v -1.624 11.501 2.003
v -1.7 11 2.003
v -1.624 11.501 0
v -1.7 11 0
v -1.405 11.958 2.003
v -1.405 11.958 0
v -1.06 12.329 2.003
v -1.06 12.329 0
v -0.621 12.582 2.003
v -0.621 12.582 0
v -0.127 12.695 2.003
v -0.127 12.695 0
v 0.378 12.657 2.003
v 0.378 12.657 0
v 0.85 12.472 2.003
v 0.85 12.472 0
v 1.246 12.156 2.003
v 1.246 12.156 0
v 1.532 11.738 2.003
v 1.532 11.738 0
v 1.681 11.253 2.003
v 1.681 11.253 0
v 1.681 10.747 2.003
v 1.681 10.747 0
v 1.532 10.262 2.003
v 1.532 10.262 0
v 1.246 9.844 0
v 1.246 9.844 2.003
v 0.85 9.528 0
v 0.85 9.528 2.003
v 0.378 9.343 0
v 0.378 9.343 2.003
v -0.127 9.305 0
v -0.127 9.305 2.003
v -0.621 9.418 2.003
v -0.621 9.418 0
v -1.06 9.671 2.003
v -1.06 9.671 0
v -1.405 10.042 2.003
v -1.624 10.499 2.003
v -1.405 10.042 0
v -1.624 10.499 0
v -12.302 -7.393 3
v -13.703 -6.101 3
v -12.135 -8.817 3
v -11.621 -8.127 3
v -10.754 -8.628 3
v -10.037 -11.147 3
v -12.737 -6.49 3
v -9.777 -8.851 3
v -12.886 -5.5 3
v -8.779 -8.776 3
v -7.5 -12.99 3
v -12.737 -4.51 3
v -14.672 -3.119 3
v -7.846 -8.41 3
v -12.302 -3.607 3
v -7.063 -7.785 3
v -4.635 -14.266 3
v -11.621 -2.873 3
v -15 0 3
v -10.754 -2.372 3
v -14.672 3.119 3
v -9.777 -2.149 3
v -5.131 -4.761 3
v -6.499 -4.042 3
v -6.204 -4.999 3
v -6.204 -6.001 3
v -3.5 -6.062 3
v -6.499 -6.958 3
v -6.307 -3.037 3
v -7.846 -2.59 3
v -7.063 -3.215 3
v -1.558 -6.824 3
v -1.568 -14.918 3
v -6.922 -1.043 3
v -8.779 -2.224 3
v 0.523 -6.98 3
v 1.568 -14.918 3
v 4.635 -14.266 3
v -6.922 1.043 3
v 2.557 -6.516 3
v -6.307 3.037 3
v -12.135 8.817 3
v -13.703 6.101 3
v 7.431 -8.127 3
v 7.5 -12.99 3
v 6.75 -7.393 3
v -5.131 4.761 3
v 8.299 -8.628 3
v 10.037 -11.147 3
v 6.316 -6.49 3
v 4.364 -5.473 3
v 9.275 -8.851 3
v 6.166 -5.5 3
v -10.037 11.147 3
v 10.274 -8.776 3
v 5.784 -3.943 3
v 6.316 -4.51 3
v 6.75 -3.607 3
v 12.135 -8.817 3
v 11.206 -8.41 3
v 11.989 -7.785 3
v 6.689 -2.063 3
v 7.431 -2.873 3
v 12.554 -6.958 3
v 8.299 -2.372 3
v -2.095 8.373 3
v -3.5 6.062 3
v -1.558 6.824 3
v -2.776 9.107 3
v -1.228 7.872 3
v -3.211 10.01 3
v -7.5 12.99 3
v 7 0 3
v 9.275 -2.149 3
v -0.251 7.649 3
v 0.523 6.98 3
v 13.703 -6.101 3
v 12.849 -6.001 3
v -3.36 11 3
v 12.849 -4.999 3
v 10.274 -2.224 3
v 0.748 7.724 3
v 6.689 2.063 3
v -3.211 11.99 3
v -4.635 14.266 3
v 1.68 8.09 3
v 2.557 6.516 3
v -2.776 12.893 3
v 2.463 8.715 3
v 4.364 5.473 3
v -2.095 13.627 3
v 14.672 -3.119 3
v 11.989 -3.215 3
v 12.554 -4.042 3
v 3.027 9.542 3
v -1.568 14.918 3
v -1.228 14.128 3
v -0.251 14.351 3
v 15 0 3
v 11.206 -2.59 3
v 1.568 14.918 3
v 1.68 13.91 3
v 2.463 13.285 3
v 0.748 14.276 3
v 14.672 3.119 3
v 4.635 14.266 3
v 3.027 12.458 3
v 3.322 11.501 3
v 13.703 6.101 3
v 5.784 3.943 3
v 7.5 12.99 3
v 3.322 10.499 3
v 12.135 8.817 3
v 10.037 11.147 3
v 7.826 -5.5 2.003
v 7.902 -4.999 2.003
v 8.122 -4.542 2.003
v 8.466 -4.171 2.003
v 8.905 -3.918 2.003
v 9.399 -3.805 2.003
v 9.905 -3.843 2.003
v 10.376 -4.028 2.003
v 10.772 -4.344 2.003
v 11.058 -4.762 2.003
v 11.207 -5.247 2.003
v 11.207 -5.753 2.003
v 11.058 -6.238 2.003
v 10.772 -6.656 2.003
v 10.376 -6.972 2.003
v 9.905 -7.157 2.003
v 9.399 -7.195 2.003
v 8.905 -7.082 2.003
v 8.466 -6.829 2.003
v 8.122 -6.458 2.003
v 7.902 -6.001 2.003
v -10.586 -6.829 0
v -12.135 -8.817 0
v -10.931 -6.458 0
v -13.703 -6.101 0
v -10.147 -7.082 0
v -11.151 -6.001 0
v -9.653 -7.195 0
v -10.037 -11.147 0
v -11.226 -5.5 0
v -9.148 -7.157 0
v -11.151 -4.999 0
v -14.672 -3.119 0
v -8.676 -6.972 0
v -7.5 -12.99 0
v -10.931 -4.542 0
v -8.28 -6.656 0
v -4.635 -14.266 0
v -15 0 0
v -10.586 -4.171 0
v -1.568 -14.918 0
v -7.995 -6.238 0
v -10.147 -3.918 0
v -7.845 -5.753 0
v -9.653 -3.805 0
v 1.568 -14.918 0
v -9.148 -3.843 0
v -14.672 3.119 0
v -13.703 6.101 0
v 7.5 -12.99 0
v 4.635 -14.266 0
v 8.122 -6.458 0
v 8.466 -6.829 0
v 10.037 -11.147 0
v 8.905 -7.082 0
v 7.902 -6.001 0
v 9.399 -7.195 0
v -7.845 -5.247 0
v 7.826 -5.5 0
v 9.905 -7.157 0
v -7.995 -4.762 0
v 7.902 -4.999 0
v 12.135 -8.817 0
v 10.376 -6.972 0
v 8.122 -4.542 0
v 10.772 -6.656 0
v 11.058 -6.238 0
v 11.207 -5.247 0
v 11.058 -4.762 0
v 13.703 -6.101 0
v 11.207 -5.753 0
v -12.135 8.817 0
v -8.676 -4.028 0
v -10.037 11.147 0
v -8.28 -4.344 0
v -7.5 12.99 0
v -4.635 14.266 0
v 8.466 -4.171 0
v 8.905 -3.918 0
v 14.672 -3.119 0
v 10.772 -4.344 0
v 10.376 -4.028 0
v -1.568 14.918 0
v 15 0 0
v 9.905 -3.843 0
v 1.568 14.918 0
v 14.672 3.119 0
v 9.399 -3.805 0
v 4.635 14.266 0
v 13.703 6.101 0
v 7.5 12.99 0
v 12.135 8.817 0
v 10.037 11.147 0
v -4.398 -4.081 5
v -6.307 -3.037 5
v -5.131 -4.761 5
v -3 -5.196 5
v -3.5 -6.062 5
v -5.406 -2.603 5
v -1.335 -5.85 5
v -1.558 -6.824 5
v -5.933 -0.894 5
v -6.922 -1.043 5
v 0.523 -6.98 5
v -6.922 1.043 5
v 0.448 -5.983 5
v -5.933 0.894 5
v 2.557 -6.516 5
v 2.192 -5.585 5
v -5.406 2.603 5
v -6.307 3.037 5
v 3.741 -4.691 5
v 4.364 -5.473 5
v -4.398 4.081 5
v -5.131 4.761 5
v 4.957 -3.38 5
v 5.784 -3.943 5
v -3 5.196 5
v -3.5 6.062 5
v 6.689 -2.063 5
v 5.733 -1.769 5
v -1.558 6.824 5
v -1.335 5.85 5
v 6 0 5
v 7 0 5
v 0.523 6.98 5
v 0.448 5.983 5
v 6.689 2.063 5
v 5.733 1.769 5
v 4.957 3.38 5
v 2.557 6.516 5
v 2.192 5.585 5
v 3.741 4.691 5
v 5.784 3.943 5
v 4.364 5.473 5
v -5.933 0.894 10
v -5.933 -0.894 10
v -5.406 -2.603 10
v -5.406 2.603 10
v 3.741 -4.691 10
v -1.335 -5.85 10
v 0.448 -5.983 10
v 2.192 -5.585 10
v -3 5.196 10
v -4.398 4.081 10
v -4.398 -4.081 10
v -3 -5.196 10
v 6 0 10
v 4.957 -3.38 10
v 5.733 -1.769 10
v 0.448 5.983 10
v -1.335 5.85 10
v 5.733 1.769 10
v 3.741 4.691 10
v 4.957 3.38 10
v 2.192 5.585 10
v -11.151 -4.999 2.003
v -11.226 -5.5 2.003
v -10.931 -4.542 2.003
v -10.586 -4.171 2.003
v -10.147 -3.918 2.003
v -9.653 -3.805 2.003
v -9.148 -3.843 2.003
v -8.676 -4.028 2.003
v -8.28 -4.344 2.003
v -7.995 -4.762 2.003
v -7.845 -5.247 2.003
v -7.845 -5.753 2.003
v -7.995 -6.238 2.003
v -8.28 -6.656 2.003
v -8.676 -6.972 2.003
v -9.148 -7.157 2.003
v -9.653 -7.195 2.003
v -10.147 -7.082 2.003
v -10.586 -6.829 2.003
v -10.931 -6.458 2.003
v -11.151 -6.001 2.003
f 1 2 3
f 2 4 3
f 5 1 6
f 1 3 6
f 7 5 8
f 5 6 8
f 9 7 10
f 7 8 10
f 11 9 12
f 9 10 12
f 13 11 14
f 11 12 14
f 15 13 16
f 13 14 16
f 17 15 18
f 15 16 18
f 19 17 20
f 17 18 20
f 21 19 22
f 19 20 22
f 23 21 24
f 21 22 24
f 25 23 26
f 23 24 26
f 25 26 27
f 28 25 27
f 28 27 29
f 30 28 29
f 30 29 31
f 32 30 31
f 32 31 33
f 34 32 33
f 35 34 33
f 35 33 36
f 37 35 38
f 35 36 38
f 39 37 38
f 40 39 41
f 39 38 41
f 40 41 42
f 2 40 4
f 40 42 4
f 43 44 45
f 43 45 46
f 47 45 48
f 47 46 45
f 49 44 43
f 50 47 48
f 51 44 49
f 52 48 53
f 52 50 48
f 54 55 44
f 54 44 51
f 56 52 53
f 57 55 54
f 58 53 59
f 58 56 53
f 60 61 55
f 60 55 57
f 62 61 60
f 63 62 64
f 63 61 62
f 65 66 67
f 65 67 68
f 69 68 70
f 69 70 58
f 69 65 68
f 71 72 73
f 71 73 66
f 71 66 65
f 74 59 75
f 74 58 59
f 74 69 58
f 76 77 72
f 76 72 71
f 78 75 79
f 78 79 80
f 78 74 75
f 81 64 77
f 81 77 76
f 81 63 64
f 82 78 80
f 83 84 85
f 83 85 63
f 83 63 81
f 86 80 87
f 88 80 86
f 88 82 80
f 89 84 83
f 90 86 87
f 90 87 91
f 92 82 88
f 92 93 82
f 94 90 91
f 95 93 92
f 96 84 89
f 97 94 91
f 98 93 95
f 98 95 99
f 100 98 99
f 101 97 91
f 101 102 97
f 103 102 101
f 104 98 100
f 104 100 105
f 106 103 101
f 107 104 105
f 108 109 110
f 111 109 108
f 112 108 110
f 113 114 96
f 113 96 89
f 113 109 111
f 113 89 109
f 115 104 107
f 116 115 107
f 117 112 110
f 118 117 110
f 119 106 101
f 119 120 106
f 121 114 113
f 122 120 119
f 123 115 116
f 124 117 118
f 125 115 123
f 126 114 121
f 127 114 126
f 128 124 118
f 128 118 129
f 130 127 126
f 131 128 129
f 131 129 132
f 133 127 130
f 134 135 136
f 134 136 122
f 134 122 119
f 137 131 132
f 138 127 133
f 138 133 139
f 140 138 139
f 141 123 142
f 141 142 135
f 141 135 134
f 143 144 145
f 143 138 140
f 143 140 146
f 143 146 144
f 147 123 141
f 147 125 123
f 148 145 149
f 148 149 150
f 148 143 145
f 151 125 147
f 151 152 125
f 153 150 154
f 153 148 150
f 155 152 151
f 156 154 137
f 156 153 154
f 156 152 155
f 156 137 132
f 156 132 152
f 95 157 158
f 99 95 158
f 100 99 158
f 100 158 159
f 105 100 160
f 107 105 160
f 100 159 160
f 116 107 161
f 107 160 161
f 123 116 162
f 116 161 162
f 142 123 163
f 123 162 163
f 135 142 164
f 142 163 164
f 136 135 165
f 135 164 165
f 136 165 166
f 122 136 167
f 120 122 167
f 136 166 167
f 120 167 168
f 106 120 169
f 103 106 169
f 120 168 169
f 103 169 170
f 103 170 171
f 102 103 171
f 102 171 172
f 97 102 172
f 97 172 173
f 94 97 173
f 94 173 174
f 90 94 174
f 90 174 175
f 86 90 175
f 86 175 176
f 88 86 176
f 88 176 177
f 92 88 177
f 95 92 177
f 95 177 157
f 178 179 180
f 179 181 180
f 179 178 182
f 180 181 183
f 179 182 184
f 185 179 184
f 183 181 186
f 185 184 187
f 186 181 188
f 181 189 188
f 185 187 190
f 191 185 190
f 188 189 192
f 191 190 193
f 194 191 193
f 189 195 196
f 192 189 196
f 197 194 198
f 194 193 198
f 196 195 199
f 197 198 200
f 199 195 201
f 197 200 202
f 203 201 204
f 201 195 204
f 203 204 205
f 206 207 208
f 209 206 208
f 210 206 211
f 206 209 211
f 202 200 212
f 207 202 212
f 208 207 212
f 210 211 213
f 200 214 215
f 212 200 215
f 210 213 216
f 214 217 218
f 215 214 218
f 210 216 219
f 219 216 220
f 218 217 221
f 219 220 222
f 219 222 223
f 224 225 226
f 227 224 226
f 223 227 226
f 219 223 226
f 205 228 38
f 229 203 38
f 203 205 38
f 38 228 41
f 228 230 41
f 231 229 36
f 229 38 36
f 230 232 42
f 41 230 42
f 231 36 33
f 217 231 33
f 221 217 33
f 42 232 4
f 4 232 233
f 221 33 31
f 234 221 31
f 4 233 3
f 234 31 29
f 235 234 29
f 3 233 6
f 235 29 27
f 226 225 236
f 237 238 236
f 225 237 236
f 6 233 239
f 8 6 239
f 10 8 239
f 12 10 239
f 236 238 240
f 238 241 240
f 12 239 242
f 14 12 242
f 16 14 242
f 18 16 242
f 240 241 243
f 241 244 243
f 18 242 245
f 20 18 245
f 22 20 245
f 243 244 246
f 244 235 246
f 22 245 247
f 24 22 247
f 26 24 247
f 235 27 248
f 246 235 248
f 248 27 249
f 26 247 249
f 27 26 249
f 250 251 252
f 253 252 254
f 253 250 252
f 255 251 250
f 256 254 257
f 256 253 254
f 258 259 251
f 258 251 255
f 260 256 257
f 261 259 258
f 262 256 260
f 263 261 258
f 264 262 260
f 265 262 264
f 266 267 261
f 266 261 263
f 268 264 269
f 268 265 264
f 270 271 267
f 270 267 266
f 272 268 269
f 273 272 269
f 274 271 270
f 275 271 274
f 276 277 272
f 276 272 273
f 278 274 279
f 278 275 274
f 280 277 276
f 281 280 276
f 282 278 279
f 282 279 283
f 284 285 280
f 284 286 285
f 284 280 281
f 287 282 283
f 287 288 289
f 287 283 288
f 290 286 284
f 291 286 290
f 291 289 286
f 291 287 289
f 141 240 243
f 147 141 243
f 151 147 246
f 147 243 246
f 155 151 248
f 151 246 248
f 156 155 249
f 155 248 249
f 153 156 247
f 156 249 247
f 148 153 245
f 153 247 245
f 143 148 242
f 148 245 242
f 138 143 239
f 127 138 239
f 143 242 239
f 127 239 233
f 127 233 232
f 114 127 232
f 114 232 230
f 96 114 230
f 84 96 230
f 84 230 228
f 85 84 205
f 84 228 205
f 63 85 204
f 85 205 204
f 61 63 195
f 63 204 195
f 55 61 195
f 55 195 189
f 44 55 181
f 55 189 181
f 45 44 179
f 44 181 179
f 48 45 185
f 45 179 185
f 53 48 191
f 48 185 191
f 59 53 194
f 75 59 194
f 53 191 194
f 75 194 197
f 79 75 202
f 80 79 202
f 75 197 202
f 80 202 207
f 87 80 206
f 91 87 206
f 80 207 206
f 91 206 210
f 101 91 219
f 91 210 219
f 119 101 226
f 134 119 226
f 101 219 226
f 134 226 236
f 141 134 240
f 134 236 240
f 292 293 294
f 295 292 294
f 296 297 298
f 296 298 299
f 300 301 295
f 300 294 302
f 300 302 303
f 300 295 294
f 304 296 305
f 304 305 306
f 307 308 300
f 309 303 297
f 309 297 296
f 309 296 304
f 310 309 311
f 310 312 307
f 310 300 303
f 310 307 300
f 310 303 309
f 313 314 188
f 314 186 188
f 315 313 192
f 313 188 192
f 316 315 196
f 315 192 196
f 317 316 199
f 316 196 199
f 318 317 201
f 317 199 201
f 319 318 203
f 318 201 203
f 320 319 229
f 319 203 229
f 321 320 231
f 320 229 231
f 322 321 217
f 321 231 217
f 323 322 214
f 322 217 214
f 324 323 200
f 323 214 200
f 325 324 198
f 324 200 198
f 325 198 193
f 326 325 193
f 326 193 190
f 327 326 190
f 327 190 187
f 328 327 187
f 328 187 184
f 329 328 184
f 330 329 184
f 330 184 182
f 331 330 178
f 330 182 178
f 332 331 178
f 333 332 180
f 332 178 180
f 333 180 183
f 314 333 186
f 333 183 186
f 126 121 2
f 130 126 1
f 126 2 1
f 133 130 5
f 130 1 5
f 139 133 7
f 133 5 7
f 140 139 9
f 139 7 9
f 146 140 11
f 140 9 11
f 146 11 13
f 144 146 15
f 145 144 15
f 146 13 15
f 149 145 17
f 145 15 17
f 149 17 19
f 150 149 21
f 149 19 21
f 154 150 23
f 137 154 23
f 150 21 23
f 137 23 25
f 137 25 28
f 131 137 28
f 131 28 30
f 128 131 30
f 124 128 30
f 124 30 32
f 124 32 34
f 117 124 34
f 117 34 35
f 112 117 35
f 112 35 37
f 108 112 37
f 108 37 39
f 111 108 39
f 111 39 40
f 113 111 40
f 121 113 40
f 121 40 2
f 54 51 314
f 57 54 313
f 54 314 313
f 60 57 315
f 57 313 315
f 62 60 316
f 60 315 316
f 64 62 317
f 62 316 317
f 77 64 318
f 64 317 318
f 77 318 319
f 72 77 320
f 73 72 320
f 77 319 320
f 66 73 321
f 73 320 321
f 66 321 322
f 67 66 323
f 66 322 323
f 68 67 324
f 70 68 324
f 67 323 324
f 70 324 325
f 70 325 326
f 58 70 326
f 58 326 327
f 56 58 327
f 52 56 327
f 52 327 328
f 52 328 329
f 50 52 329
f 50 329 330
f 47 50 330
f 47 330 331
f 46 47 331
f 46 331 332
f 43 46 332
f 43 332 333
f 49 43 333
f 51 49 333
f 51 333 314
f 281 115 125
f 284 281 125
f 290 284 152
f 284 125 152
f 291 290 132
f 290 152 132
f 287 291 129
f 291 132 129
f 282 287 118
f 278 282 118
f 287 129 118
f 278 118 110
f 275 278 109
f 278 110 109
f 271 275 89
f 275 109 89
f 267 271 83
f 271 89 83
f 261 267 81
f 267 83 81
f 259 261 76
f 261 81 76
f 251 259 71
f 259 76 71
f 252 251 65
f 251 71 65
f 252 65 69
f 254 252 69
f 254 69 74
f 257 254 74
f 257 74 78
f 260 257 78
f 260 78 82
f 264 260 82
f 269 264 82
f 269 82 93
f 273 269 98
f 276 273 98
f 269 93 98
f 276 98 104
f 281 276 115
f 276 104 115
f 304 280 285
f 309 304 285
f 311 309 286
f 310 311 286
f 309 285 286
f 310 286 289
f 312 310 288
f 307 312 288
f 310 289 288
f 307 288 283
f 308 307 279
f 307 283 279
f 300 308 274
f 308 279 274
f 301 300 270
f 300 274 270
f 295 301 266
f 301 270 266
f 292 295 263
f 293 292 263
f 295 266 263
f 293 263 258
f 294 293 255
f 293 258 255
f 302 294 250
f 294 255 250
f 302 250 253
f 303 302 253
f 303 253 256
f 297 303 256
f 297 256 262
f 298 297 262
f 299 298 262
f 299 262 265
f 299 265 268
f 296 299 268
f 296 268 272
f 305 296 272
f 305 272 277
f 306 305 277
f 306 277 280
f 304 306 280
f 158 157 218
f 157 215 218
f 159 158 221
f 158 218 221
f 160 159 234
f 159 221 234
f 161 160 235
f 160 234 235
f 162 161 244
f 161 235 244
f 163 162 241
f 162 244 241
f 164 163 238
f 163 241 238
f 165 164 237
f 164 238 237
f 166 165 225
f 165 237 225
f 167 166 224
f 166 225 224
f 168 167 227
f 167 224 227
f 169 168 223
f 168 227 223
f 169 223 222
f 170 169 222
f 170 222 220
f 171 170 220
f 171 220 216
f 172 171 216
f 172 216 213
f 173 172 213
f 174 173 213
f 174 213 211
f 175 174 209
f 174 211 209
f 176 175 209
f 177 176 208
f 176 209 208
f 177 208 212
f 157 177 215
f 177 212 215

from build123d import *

# Parameters (mm, degrees)
SKETCH_1_R                   = 15
EXTRUDE_1_DEPTH              = 3
SKETCH_2_R                   = 6
EXTRUDE_2_DEPTH              = 7
HOLE_WIZARD_M3_1_D           = 3.4
HOLE_WIZARD_M3_1_DEPTH       = 14.54
HOLE_WIZARD_M3_1_CSINK_D     = 6.72
HOLE_WIZARD_M3_1_CSINK_ANGLE = 118
HOLE_WIZARD_M3_1_TIP         = 1.021463052
SKETCH_6_R                   = 7
SKETCH_6_R_2                 = 6
EXTRUDE_3_DEPTH              = 2


with BuildPart() as part:
    # 草图1 → 凸台-拉伸1 (new body)
    with BuildSketch(Plane.XY):
        Circle(SKETCH_1_R)
    extrude(amount=EXTRUDE_1_DEPTH)

    # 草图2 → 凸台-拉伸2 (add)
    with BuildSketch(Plane.XY.offset(3)):
        Circle(SKETCH_2_R)
    extrude(amount=EXTRUDE_2_DEPTH)

    # M3 六角凹锥坑螺钉的锥形沉头孔1
    with Locations(Plane(origin=(0, 11, 3), x_dir=(1, 0, 0), z_dir=(0, 0, 1))):
        with Locations((0, 0), (-9.526279442, -16.5), (9.526279442, -16.5)):
            CounterSinkHole(HOLE_WIZARD_M3_1_D / 2, HOLE_WIZARD_M3_1_CSINK_D / 2, depth=HOLE_WIZARD_M3_1_DEPTH, counter_sink_angle=HOLE_WIZARD_M3_1_CSINK_ANGLE)
            with Locations((0, 0, -(HOLE_WIZARD_M3_1_DEPTH + HOLE_WIZARD_M3_1_TIP / 2))):  # 118° drill point
                Cone(0, HOLE_WIZARD_M3_1_D / 2, HOLE_WIZARD_M3_1_TIP, mode=Mode.SUBTRACT)

    # 草图6 → 凸台-拉伸3 (add)
    with BuildSketch(Plane.XY.offset(3)):
        Circle(SKETCH_6_R)
        Circle(SKETCH_6_R_2, mode=Mode.SUBTRACT)
    extrude(amount=EXTRUDE_3_DEPTH)


solid = part.part
